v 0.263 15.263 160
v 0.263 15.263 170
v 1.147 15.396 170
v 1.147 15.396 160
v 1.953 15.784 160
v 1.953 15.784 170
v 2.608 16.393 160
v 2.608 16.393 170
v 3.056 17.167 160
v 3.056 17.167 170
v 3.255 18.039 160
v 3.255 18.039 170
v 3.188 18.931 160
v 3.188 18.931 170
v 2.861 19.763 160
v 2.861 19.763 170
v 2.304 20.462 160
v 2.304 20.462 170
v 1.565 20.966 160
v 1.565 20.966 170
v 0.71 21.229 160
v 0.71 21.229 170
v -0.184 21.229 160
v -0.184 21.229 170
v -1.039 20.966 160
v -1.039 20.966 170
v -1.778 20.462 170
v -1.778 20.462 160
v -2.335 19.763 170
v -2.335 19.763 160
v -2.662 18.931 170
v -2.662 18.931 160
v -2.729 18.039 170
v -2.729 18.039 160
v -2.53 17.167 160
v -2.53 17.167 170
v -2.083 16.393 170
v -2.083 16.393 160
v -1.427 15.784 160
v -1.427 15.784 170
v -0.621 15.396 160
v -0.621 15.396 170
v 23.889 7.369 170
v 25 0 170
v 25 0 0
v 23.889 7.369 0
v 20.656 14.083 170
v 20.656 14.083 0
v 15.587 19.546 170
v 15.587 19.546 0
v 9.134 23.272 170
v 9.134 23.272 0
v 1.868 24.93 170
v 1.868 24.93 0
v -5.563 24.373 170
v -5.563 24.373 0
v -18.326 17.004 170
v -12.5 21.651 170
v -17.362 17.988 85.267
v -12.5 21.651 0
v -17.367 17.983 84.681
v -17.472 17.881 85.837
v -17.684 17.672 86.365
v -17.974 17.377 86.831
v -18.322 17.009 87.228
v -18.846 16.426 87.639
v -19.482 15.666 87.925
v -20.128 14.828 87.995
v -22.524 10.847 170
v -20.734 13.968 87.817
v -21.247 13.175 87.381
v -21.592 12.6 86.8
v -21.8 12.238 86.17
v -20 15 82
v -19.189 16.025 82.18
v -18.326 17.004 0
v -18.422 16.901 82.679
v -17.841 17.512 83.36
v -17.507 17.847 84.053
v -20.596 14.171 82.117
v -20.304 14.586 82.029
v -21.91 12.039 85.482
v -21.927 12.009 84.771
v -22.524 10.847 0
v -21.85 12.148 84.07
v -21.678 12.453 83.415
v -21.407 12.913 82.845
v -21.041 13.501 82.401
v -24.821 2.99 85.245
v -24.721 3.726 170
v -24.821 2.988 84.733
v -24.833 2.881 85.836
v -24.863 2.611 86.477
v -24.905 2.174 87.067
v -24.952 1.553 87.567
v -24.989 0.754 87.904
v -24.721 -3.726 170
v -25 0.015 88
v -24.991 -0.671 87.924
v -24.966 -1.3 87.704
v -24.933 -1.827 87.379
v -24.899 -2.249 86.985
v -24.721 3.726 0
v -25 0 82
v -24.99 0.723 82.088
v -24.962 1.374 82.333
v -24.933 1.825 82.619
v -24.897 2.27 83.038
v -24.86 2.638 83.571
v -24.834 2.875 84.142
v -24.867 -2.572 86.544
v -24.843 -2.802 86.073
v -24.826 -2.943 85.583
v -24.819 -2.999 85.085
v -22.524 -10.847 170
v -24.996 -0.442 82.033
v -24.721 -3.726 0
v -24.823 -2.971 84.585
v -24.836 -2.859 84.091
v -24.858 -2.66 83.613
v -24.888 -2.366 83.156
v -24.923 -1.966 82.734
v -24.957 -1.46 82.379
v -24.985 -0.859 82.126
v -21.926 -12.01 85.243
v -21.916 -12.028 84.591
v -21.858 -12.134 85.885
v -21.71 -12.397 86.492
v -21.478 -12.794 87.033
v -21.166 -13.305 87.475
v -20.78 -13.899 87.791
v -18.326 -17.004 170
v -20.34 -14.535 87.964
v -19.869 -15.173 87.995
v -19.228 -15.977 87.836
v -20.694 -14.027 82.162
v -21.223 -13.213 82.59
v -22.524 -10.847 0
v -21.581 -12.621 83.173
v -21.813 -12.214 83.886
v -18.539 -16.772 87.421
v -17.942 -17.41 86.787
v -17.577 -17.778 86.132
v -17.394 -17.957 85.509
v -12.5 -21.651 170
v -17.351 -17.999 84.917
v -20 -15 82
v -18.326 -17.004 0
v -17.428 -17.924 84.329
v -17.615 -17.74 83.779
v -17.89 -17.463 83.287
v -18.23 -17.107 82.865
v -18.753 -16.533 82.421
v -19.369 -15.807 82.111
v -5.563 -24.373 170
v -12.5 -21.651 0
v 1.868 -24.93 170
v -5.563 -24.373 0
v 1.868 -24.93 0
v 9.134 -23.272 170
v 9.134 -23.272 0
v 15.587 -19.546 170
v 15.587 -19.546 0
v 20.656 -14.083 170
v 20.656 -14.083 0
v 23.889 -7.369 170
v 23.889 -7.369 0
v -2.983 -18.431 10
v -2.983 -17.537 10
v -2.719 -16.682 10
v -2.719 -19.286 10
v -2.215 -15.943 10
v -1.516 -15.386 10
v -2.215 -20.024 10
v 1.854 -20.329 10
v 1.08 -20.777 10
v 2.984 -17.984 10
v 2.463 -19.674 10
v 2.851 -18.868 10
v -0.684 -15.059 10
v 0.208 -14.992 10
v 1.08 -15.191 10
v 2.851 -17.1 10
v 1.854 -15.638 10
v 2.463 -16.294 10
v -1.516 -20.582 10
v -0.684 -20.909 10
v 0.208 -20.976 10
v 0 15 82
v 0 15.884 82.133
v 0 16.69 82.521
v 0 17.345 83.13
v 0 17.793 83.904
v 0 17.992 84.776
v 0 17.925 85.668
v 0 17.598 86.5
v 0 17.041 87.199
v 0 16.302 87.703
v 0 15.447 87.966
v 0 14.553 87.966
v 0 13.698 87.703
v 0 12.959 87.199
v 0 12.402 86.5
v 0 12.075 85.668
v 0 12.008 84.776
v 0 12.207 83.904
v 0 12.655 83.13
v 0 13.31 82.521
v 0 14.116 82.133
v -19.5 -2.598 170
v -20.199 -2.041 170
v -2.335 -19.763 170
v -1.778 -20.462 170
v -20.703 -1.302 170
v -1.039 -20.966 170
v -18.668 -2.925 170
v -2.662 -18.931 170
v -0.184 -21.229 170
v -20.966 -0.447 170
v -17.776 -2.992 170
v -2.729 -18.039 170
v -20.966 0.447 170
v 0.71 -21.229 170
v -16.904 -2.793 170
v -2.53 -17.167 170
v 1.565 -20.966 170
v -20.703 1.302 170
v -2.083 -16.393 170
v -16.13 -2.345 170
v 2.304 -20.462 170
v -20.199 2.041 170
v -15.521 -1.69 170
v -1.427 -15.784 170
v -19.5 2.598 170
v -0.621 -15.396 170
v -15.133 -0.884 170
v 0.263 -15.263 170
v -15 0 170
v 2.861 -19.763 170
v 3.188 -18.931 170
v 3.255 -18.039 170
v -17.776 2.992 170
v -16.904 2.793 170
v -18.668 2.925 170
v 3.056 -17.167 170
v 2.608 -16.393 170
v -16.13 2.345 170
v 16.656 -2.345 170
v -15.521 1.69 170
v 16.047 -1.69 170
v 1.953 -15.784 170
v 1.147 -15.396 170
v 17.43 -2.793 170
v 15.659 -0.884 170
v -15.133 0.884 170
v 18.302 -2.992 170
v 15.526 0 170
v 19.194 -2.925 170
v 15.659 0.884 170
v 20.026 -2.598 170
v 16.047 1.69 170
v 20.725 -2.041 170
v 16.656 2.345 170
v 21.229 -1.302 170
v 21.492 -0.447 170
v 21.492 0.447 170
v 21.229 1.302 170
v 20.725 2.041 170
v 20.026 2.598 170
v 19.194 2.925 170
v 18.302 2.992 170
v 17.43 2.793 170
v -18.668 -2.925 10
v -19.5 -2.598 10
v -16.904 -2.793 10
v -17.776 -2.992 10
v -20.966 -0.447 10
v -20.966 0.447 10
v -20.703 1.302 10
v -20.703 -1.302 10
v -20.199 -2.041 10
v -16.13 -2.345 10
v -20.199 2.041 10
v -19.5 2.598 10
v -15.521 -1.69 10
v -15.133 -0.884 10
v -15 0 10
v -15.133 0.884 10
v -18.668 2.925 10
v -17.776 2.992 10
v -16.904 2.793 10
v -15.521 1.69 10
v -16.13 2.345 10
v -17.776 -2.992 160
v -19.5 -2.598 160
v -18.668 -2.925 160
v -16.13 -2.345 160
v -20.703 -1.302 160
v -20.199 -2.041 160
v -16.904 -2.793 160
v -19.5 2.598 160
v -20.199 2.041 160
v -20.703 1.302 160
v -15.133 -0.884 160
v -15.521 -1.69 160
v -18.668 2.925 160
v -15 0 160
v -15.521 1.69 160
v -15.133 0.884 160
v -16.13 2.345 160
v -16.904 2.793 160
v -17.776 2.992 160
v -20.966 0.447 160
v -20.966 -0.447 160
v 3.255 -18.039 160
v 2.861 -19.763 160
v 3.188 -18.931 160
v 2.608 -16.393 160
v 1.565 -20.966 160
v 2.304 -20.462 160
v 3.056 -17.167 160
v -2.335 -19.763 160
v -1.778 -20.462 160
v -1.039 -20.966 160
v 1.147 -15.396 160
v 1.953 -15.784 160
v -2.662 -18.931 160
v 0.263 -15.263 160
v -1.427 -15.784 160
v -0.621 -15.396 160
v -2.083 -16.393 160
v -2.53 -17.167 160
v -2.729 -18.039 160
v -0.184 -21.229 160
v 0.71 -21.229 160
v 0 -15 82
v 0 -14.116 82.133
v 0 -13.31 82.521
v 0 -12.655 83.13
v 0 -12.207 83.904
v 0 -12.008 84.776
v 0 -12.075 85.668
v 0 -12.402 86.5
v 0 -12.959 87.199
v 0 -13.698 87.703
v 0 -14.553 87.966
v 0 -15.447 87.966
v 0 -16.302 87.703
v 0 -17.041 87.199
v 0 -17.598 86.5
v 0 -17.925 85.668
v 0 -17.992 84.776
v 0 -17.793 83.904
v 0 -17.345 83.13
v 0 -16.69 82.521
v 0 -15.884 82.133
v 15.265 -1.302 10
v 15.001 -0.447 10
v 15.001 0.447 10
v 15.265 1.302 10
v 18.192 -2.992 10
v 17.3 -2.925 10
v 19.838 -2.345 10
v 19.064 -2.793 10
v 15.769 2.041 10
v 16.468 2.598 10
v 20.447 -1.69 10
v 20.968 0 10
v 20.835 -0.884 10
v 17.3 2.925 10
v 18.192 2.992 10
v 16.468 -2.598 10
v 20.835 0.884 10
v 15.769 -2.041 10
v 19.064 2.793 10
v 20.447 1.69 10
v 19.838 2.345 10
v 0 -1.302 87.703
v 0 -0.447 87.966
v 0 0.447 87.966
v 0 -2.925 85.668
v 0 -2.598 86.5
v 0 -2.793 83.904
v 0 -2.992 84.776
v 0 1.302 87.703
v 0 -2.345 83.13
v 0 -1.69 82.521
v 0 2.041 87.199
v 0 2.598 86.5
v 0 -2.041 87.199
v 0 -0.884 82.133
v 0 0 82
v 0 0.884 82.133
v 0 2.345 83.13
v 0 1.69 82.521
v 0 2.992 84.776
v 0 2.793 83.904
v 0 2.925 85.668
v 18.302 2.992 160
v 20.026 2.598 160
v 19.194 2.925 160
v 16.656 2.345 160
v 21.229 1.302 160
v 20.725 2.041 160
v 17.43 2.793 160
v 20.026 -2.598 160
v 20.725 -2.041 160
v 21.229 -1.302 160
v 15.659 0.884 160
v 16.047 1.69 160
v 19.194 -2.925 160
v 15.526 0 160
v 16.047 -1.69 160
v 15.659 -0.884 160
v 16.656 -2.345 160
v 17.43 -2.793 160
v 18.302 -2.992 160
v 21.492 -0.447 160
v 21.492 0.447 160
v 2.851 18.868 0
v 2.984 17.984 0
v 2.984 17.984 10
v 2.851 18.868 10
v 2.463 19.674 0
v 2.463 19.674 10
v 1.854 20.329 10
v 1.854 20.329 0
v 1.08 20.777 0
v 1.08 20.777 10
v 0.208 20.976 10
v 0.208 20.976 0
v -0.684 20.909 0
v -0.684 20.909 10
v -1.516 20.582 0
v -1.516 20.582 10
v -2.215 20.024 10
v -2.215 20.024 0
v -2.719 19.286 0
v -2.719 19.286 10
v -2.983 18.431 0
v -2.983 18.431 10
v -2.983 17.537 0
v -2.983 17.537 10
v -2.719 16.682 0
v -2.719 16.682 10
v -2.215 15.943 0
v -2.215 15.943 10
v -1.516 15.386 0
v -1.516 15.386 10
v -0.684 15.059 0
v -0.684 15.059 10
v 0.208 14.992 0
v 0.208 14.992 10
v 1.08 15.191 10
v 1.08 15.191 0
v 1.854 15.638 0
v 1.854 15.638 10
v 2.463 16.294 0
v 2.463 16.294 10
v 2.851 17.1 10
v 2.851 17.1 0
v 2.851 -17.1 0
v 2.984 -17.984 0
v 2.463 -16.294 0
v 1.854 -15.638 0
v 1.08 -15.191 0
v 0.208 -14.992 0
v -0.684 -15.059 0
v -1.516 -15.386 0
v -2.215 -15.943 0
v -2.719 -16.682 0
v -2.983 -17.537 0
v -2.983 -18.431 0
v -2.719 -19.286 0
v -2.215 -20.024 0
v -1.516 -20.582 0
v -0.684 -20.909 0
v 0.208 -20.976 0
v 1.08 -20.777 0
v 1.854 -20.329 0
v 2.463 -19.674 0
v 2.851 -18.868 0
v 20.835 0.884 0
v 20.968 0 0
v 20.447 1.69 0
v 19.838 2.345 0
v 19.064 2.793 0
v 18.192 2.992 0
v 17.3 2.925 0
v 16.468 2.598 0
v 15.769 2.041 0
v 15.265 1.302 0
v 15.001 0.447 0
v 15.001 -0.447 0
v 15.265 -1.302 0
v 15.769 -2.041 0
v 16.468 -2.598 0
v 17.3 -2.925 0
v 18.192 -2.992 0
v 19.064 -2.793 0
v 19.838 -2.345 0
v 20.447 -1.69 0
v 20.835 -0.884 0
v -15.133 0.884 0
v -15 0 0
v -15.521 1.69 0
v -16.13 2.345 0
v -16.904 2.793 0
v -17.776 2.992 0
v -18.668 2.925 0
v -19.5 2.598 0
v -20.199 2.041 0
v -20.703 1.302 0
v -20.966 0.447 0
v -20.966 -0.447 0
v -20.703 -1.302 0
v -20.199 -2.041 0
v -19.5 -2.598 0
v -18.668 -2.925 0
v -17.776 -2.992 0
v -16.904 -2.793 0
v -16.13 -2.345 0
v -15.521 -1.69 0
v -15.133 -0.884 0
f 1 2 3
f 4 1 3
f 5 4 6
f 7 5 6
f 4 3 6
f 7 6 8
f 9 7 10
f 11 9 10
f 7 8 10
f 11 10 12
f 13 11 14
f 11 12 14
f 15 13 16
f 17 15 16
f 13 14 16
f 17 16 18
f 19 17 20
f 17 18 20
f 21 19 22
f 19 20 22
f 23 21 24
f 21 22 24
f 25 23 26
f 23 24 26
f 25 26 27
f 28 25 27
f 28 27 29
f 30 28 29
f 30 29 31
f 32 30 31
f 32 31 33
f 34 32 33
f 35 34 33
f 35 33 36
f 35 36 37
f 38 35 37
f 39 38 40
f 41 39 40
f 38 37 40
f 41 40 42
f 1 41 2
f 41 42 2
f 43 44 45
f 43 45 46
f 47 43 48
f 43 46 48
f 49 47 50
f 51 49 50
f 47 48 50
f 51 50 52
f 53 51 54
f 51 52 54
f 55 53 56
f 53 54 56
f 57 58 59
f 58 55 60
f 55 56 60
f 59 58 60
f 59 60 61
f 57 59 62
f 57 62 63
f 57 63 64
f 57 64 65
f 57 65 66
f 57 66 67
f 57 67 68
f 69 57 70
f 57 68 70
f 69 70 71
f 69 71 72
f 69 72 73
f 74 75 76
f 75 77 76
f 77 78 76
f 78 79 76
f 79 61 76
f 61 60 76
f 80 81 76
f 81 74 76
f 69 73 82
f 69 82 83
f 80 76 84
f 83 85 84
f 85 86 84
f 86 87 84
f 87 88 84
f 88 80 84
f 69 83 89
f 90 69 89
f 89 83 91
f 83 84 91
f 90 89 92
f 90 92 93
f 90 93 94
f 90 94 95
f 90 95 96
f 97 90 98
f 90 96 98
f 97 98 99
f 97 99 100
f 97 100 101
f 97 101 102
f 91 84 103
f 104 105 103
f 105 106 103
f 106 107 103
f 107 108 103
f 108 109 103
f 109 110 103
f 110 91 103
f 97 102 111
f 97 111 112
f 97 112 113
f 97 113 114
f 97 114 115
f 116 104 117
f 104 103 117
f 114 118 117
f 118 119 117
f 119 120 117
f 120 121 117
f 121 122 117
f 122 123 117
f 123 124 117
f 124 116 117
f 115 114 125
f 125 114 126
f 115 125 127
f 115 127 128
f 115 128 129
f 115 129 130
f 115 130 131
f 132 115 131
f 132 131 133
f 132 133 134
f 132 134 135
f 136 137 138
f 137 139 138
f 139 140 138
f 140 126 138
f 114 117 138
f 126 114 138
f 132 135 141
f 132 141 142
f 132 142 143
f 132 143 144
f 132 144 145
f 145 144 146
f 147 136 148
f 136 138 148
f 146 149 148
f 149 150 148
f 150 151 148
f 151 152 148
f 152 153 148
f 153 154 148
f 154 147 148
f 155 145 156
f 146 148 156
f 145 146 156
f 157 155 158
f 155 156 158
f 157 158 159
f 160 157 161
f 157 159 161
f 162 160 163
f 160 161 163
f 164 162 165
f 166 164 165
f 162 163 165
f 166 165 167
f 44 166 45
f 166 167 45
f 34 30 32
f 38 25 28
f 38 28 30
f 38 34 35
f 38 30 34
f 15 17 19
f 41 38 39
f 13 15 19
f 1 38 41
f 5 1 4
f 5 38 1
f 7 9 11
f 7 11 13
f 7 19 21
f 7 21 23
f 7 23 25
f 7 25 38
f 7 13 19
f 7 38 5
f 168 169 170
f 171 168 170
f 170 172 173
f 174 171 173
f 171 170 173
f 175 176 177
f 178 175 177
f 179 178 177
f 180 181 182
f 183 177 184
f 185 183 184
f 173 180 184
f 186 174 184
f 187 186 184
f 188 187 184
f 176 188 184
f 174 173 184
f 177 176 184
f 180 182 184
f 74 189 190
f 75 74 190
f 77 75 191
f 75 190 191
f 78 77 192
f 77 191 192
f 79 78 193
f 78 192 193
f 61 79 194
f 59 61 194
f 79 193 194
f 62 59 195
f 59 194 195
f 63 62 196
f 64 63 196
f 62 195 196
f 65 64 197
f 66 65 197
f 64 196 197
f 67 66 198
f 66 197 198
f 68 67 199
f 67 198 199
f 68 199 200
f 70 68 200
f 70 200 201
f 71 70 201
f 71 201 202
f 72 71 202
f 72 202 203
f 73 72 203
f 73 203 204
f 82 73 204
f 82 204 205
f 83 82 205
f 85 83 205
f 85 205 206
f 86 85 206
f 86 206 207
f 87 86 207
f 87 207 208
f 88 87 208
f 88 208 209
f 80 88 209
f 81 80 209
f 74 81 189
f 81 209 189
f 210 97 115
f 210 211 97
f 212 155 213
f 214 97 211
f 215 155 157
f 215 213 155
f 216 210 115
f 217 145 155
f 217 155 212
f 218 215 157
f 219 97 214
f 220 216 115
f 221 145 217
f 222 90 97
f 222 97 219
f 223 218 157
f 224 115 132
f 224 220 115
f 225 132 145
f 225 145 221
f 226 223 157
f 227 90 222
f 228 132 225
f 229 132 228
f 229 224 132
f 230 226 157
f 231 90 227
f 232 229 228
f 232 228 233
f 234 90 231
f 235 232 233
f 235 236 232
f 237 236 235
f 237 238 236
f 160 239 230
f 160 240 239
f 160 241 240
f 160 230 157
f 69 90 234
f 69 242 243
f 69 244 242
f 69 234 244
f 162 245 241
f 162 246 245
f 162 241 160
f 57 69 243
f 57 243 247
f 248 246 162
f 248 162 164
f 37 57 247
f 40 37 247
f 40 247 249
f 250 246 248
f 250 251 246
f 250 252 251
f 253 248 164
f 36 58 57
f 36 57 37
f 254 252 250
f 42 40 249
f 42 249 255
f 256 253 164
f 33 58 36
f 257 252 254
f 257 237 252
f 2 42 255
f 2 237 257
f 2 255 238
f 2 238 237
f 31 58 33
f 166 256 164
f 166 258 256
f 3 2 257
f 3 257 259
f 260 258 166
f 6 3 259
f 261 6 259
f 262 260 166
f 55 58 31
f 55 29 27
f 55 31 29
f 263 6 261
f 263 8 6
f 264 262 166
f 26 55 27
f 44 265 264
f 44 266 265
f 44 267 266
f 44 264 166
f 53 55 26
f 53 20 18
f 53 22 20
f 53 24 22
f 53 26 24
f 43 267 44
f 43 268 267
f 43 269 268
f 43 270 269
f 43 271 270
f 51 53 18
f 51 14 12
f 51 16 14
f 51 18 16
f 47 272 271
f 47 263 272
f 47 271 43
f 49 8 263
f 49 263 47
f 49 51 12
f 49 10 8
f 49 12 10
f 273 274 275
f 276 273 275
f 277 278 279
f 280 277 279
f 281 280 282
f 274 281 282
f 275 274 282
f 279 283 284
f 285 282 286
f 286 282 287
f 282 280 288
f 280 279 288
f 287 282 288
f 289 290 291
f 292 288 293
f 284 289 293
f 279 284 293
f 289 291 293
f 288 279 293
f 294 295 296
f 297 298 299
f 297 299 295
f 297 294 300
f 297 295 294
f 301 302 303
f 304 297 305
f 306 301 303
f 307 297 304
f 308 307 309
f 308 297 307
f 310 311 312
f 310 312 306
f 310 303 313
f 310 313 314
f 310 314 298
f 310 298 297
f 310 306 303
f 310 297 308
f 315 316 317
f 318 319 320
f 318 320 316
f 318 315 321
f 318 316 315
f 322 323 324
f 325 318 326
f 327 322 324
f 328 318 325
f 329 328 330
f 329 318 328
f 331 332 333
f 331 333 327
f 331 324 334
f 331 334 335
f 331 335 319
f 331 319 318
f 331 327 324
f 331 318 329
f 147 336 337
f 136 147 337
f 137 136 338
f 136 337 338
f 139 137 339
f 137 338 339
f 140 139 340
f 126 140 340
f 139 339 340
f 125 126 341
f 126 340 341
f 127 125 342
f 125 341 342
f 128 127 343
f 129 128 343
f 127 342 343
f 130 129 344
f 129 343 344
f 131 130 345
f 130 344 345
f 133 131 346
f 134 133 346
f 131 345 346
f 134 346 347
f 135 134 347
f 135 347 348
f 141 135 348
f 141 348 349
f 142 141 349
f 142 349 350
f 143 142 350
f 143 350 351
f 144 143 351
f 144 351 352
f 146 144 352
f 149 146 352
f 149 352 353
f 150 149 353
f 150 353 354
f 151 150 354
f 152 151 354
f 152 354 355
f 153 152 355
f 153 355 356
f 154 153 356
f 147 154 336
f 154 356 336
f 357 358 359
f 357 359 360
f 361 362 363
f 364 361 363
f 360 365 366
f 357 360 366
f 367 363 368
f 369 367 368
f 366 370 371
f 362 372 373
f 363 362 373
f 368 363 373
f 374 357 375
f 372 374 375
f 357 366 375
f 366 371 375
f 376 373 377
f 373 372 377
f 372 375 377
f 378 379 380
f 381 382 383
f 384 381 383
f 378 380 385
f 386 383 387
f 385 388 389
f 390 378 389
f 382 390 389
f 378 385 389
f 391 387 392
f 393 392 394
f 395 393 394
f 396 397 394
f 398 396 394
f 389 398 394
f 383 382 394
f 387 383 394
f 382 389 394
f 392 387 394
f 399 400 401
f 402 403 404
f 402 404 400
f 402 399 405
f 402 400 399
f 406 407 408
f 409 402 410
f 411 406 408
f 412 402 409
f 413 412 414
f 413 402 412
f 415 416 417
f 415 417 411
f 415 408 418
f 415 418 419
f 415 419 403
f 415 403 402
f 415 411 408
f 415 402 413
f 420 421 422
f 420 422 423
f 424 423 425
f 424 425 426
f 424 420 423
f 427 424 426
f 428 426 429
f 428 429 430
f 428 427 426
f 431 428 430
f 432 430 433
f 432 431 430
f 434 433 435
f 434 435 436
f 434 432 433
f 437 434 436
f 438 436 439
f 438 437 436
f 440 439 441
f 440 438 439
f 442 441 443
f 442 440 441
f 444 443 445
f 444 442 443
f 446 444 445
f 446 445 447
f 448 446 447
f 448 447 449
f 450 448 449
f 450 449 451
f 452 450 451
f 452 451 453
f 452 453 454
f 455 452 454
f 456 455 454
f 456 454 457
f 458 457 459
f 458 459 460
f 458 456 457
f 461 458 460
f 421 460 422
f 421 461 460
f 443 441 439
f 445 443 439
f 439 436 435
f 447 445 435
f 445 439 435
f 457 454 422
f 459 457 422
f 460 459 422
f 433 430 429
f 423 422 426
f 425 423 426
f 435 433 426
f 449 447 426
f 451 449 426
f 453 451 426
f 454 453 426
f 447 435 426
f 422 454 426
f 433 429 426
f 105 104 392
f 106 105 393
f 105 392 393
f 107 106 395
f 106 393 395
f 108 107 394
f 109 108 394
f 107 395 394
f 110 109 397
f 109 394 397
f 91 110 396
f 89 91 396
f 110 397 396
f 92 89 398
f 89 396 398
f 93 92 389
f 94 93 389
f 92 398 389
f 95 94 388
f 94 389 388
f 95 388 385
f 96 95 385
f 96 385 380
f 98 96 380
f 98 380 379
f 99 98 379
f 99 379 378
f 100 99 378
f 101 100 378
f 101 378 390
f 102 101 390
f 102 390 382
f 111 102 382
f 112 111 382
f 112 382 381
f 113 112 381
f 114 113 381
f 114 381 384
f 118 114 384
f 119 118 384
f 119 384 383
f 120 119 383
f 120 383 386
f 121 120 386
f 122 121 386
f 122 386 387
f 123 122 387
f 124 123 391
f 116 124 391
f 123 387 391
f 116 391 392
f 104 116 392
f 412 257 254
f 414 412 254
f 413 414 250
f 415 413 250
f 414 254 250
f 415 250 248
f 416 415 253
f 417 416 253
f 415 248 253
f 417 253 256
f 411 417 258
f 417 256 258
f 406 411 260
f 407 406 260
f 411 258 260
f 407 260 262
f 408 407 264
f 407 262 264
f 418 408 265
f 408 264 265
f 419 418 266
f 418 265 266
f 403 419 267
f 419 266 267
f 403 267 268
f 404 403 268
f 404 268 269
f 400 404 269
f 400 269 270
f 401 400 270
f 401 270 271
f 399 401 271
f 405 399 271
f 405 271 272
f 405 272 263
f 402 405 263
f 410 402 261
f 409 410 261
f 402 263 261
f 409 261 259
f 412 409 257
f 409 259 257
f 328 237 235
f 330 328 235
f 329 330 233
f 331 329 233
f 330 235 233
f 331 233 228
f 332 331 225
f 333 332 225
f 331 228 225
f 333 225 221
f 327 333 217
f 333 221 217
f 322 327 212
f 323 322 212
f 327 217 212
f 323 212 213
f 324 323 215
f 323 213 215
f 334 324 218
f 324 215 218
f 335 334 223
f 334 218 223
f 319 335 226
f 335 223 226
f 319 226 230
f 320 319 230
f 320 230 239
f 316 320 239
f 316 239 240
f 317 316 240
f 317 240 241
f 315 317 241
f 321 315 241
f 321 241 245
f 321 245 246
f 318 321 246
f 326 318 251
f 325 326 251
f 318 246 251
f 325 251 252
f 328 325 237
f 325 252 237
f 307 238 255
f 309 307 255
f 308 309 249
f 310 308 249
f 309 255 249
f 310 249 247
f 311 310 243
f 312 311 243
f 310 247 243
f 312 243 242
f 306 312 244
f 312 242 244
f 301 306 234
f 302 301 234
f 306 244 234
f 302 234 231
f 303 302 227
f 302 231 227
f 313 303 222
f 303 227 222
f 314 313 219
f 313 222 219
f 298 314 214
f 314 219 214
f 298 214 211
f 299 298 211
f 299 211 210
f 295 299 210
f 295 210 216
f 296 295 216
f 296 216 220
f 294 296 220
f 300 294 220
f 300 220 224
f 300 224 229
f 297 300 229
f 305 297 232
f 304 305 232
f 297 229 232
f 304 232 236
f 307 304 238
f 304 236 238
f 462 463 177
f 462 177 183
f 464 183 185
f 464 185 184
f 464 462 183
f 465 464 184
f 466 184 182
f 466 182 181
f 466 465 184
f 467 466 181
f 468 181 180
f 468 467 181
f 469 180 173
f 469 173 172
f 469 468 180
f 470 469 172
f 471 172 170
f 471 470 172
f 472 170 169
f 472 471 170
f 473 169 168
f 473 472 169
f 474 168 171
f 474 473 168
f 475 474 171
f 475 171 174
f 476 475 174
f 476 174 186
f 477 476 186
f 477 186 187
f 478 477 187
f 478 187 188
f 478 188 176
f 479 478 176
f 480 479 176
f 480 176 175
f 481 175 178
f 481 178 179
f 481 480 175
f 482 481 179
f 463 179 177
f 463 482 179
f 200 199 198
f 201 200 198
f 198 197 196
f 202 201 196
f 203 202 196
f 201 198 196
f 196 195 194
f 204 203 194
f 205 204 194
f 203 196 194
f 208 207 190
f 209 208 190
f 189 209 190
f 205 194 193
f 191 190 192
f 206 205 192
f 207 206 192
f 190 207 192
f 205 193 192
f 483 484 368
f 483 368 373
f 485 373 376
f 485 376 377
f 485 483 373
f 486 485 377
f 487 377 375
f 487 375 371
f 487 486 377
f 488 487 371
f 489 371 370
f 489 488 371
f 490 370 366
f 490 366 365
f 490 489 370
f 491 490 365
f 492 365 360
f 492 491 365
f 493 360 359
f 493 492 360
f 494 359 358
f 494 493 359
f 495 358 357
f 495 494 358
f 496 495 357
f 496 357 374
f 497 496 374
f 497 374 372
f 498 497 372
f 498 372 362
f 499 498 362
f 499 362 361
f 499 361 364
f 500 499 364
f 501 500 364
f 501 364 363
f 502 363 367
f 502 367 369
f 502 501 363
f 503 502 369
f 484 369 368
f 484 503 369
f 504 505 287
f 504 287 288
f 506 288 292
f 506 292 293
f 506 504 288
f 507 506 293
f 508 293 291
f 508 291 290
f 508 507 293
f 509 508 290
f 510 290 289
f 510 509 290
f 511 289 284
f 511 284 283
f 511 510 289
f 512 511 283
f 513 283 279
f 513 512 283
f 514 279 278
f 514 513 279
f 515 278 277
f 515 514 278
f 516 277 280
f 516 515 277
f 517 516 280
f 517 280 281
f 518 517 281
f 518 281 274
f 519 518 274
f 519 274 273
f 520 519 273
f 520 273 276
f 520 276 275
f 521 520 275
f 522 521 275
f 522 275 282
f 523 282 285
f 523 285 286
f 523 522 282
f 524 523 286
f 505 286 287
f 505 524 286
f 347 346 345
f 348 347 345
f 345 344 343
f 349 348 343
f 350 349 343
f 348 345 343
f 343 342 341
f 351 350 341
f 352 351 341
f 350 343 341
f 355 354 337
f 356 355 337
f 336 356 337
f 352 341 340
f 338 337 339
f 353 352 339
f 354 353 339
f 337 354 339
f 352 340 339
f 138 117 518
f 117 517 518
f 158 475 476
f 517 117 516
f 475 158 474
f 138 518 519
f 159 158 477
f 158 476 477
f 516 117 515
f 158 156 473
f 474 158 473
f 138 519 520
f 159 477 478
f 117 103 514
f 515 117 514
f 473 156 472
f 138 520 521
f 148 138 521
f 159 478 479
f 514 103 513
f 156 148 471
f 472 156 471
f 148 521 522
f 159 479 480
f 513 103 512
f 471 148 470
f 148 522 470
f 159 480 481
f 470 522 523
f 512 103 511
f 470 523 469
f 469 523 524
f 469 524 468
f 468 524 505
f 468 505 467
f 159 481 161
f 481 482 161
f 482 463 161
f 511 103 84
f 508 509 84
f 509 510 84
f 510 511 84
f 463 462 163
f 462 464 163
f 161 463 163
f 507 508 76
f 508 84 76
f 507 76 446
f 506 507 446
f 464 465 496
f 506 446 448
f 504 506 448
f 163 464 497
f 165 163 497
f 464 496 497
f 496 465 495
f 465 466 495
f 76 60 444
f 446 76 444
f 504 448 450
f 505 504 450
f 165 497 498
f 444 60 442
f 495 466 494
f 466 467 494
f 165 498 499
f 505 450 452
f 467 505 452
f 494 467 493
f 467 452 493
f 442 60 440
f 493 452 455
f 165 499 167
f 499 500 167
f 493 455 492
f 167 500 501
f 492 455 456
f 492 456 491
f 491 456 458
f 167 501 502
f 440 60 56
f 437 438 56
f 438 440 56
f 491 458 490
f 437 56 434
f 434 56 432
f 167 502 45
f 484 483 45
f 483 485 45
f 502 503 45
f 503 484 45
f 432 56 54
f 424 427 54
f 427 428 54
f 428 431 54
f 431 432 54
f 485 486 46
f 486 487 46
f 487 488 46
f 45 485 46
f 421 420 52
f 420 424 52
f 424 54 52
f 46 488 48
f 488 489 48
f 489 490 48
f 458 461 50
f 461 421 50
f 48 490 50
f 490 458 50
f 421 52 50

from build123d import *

# Parameters (mm, degrees)
SKETCH_1_R               = 25
EXTRUDE_2_DEPTH          = 170
SKETCH_2_R               = 3
CUT_EXTRUDE_1_DEPTH      = 10
PATTERN_CIRCULAR_1_COUNT = 4
MIRROR_1_OUTLINE_R       = 3
MIRROR_1_DEPTH           = 10
SKETCH_3_R               = 3
CUT_EXTRUDE_2_DEPTH      = 50


# Read off the part's stored shape, not the designer's step: 镜向1
with BuildPart() as part:
    # 草图1 → 凸台-拉伸2 (new body)
    with BuildSketch(Plane.XY):
        Circle(SKETCH_1_R)
    extrude(amount=EXTRUDE_2_DEPTH)

    # 草图2 → 切除-拉伸1 (cut)
    with BuildSketch(Plane.XY.offset(170)):
        with Locations((-18, 0)):
            Circle(SKETCH_2_R)
    cut_extrude_1 = extrude(amount=-CUT_EXTRUDE_1_DEPTH, mode=Mode.SUBTRACT)

    # 阵列(圆周)1: 切除-拉伸1 ×4 about axis
    pattern_circular_1_axis = Axis((0.262987013, 0, 0), (0, 0, 1))
    for i in range(1, PATTERN_CIRCULAR_1_COUNT):
        add(cut_extrude_1.rotate(pattern_circular_1_axis, i * 360 / PATTERN_CIRCULAR_1_COUNT), mode=Mode.SUBTRACT)

    # 镜向1 outline → 镜向1 (cut)
    with BuildSketch(Plane.XY):
        with Locations((-18, 0)):
            Circle(MIRROR_1_OUTLINE_R)
        with Locations((-0.016073909, 17.983926091)):
            Circle(MIRROR_1_OUTLINE_R)
        with Locations((17.967852182, 0)):
            Circle(MIRROR_1_OUTLINE_R)
        with Locations((-0.016073909, -17.983926091)):
            Circle(MIRROR_1_OUTLINE_R)
    extrude(amount=MIRROR_1_DEPTH, mode=Mode.SUBTRACT)

    # 草图3 → 切除-拉伸2 (cut)
    with BuildSketch(Plane(origin=(0, 0, 0), x_dir=(0, 0, -1), z_dir=(1, 0, 0))):
        with Locations((-85, 0)):
            Circle(SKETCH_3_R)
        with Locations((-85, 15)):
            Circle(SKETCH_3_R)
        with Locations((-85, -15)):
            Circle(SKETCH_3_R)
    extrude(amount=-CUT_EXTRUDE_2_DEPTH, mode=Mode.SUBTRACT)


solid = part.part
